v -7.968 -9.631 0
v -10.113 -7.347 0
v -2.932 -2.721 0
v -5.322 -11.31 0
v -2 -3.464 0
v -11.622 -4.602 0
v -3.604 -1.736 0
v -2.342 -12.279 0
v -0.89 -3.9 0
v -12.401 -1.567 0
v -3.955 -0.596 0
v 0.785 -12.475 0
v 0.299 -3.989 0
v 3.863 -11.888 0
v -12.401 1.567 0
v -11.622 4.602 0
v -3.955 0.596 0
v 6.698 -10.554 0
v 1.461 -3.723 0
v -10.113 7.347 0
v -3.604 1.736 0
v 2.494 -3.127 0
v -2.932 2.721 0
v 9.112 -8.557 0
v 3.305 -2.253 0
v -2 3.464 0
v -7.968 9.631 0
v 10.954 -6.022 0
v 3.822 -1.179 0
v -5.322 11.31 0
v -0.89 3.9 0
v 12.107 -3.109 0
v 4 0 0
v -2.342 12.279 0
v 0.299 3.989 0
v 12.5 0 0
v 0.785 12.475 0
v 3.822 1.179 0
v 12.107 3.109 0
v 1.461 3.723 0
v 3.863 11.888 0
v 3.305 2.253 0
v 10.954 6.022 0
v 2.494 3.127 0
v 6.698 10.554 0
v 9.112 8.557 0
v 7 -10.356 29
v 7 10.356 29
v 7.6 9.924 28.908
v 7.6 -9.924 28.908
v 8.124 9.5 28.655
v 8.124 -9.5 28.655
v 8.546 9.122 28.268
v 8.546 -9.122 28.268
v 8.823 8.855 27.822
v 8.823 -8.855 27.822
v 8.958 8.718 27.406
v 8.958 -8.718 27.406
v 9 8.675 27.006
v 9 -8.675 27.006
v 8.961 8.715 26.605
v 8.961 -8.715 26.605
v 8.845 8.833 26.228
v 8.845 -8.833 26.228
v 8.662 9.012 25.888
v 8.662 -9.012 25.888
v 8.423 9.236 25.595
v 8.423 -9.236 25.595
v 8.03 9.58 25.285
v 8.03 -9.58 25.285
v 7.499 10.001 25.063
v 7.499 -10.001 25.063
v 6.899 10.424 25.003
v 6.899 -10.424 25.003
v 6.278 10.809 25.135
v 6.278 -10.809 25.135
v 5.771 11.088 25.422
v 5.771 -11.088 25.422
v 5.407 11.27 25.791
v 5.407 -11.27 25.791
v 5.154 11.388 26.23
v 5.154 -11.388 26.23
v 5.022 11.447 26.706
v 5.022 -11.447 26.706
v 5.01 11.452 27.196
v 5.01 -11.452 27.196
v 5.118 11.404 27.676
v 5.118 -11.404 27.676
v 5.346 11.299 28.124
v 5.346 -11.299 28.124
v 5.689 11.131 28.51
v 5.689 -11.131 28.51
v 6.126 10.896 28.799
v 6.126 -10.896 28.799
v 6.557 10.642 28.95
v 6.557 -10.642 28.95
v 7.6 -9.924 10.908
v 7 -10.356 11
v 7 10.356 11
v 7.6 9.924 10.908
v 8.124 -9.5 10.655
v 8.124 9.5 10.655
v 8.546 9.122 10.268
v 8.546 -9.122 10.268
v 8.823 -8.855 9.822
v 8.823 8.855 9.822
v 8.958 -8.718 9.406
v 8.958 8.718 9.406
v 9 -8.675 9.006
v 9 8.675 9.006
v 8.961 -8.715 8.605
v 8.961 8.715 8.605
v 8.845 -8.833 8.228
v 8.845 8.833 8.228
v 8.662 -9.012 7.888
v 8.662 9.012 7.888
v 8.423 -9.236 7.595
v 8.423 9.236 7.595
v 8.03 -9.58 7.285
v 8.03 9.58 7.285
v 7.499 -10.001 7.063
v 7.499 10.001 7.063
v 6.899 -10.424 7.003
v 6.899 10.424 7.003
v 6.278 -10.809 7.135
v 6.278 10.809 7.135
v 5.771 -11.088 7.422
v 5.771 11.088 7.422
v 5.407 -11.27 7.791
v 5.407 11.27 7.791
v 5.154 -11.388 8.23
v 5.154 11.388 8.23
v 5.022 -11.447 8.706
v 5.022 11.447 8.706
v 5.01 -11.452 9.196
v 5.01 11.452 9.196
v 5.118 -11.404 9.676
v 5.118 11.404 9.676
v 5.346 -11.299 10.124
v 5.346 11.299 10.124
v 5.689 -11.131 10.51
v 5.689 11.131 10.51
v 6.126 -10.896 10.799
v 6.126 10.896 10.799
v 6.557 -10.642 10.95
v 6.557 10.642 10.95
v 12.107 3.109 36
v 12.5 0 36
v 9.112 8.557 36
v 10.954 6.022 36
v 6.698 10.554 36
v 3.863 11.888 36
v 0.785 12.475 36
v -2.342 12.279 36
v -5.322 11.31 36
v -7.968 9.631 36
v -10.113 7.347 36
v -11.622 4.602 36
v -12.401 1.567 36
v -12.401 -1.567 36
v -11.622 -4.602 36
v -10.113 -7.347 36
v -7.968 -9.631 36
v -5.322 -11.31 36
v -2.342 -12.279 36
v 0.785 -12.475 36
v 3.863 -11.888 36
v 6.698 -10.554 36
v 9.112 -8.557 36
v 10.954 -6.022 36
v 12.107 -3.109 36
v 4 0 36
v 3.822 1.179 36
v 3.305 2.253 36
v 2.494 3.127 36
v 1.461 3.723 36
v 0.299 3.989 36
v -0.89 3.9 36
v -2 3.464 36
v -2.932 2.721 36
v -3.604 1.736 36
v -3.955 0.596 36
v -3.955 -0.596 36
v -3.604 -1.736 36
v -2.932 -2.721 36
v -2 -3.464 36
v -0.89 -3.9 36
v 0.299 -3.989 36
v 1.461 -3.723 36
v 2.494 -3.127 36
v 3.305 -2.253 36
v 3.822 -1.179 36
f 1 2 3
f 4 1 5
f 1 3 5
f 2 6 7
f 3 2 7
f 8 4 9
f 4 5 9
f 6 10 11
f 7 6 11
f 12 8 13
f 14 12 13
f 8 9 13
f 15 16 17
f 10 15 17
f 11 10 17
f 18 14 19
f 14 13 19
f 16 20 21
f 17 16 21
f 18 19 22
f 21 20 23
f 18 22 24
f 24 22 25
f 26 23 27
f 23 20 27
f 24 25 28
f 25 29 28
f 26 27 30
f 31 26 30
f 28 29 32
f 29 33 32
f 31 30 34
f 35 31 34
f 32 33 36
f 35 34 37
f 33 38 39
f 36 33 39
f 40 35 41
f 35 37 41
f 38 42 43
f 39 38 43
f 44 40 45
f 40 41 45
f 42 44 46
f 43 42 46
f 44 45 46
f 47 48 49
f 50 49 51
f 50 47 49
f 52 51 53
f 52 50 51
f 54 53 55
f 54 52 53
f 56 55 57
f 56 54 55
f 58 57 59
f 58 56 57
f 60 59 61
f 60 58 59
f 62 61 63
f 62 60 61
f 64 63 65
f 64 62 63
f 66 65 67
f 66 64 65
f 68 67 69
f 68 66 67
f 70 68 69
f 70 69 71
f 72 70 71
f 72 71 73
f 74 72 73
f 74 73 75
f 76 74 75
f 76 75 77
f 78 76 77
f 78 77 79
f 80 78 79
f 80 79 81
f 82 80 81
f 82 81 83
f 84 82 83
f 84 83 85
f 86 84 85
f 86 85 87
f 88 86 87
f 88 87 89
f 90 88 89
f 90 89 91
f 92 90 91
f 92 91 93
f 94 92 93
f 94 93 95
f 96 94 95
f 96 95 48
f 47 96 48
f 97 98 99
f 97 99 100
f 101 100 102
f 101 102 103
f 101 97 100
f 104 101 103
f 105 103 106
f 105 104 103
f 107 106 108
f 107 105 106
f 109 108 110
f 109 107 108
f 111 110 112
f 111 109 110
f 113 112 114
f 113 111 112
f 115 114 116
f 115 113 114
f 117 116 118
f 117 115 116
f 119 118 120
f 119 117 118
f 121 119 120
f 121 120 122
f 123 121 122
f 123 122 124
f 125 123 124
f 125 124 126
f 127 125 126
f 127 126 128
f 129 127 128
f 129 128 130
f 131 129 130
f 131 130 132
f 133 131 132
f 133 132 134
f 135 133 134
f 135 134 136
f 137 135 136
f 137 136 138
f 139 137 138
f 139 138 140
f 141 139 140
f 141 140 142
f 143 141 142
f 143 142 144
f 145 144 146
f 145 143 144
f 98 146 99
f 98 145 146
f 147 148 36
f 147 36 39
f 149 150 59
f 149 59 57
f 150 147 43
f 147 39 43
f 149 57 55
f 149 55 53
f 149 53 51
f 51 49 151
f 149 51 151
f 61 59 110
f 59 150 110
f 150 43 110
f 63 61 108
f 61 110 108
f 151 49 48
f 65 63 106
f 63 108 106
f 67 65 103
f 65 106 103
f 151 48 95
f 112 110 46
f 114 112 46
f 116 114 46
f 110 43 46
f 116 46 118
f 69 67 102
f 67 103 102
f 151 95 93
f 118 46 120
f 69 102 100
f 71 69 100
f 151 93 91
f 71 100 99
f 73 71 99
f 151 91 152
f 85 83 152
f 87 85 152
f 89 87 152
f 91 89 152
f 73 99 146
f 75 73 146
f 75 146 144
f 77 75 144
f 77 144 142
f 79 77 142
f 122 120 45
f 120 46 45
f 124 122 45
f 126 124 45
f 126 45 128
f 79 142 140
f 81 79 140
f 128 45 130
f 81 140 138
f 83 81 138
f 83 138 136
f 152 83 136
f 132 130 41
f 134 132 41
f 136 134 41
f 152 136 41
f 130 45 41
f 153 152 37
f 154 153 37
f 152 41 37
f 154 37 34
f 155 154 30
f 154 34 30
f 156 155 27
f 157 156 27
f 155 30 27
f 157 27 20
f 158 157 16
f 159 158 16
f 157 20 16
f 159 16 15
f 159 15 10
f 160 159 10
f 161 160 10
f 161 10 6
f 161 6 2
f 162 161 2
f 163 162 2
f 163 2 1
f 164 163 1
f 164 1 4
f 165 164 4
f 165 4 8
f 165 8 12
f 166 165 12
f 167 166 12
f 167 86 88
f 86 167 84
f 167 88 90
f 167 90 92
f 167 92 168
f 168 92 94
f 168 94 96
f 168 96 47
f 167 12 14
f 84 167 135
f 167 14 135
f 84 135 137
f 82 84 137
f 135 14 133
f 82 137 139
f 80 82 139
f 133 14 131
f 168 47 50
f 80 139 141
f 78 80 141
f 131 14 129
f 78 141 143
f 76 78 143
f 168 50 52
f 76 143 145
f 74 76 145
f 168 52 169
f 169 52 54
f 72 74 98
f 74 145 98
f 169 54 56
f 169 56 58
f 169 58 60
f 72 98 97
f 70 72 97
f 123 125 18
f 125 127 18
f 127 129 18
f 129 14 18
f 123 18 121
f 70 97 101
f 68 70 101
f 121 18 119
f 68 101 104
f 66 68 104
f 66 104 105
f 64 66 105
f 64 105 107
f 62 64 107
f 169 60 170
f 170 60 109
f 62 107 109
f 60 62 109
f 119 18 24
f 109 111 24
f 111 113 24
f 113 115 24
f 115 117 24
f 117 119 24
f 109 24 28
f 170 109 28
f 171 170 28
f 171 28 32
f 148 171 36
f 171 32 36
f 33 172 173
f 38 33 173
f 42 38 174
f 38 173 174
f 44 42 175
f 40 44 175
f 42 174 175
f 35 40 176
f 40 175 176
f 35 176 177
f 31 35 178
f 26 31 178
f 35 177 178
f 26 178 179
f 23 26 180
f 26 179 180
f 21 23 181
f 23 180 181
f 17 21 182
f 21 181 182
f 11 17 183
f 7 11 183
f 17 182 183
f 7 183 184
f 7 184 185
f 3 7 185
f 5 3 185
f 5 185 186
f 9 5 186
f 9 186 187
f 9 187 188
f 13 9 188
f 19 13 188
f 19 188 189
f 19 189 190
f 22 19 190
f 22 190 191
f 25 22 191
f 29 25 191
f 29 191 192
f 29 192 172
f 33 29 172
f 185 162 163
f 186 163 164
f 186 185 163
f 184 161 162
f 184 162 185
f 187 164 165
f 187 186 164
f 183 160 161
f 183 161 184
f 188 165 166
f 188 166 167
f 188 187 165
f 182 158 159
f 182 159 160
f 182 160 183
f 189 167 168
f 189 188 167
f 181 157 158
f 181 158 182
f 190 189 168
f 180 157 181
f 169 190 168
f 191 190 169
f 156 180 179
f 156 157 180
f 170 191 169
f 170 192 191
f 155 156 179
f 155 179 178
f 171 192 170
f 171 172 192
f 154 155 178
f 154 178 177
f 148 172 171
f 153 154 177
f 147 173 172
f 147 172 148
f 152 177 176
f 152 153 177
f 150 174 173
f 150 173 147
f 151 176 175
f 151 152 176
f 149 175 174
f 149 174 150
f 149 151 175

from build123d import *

# Parameters (mm, degrees)
SKETCH_1_R               = 12.5
EXTRUDE_1_DEPTH          = 36
SKETCH_3_R               = 4
CUT_EXTRUDE_1_DEPTH      = 41.10610926
CUT_EXTRUDE_2_DEPTH      = 41.10610926
CUT_EXTRUDE_2_DEPTH_BACK = 41.10610926
SKETCH_4_R               = 2


with BuildPart() as part:
    # 草图1 → 拉伸1 (new body)
    with BuildSketch(Plane.XY):
        Circle(SKETCH_1_R)
    extrude(amount=EXTRUDE_1_DEPTH)

    # 草图3 → 切除-拉伸1 (cut, through all)
    with BuildSketch(Plane.XY.offset(36)):
        Circle(SKETCH_3_R)
    extrude(amount=-CUT_EXTRUDE_1_DEPTH, mode=Mode.SUBTRACT)

    # 草图4 → 切除-拉伸2 (cut, two sides: drawn at the far end of the back side and taken through both)
    with BuildSketch(Plane(origin=(0, 0, 0), x_dir=(1, 0, 0), z_dir=(0, 1, 0)).offset(-CUT_EXTRUDE_2_DEPTH_BACK)):
        with Locations(Location((7, -9, 0), (0, 0, 270))):
            Circle(SKETCH_4_R)
        with Locations(Location((7, -27, 0), (0, 0, 270))):
            Circle(SKETCH_4_R)
    extrude(amount=CUT_EXTRUDE_2_DEPTH + CUT_EXTRUDE_2_DEPTH_BACK, mode=Mode.SUBTRACT)


solid = part.part
